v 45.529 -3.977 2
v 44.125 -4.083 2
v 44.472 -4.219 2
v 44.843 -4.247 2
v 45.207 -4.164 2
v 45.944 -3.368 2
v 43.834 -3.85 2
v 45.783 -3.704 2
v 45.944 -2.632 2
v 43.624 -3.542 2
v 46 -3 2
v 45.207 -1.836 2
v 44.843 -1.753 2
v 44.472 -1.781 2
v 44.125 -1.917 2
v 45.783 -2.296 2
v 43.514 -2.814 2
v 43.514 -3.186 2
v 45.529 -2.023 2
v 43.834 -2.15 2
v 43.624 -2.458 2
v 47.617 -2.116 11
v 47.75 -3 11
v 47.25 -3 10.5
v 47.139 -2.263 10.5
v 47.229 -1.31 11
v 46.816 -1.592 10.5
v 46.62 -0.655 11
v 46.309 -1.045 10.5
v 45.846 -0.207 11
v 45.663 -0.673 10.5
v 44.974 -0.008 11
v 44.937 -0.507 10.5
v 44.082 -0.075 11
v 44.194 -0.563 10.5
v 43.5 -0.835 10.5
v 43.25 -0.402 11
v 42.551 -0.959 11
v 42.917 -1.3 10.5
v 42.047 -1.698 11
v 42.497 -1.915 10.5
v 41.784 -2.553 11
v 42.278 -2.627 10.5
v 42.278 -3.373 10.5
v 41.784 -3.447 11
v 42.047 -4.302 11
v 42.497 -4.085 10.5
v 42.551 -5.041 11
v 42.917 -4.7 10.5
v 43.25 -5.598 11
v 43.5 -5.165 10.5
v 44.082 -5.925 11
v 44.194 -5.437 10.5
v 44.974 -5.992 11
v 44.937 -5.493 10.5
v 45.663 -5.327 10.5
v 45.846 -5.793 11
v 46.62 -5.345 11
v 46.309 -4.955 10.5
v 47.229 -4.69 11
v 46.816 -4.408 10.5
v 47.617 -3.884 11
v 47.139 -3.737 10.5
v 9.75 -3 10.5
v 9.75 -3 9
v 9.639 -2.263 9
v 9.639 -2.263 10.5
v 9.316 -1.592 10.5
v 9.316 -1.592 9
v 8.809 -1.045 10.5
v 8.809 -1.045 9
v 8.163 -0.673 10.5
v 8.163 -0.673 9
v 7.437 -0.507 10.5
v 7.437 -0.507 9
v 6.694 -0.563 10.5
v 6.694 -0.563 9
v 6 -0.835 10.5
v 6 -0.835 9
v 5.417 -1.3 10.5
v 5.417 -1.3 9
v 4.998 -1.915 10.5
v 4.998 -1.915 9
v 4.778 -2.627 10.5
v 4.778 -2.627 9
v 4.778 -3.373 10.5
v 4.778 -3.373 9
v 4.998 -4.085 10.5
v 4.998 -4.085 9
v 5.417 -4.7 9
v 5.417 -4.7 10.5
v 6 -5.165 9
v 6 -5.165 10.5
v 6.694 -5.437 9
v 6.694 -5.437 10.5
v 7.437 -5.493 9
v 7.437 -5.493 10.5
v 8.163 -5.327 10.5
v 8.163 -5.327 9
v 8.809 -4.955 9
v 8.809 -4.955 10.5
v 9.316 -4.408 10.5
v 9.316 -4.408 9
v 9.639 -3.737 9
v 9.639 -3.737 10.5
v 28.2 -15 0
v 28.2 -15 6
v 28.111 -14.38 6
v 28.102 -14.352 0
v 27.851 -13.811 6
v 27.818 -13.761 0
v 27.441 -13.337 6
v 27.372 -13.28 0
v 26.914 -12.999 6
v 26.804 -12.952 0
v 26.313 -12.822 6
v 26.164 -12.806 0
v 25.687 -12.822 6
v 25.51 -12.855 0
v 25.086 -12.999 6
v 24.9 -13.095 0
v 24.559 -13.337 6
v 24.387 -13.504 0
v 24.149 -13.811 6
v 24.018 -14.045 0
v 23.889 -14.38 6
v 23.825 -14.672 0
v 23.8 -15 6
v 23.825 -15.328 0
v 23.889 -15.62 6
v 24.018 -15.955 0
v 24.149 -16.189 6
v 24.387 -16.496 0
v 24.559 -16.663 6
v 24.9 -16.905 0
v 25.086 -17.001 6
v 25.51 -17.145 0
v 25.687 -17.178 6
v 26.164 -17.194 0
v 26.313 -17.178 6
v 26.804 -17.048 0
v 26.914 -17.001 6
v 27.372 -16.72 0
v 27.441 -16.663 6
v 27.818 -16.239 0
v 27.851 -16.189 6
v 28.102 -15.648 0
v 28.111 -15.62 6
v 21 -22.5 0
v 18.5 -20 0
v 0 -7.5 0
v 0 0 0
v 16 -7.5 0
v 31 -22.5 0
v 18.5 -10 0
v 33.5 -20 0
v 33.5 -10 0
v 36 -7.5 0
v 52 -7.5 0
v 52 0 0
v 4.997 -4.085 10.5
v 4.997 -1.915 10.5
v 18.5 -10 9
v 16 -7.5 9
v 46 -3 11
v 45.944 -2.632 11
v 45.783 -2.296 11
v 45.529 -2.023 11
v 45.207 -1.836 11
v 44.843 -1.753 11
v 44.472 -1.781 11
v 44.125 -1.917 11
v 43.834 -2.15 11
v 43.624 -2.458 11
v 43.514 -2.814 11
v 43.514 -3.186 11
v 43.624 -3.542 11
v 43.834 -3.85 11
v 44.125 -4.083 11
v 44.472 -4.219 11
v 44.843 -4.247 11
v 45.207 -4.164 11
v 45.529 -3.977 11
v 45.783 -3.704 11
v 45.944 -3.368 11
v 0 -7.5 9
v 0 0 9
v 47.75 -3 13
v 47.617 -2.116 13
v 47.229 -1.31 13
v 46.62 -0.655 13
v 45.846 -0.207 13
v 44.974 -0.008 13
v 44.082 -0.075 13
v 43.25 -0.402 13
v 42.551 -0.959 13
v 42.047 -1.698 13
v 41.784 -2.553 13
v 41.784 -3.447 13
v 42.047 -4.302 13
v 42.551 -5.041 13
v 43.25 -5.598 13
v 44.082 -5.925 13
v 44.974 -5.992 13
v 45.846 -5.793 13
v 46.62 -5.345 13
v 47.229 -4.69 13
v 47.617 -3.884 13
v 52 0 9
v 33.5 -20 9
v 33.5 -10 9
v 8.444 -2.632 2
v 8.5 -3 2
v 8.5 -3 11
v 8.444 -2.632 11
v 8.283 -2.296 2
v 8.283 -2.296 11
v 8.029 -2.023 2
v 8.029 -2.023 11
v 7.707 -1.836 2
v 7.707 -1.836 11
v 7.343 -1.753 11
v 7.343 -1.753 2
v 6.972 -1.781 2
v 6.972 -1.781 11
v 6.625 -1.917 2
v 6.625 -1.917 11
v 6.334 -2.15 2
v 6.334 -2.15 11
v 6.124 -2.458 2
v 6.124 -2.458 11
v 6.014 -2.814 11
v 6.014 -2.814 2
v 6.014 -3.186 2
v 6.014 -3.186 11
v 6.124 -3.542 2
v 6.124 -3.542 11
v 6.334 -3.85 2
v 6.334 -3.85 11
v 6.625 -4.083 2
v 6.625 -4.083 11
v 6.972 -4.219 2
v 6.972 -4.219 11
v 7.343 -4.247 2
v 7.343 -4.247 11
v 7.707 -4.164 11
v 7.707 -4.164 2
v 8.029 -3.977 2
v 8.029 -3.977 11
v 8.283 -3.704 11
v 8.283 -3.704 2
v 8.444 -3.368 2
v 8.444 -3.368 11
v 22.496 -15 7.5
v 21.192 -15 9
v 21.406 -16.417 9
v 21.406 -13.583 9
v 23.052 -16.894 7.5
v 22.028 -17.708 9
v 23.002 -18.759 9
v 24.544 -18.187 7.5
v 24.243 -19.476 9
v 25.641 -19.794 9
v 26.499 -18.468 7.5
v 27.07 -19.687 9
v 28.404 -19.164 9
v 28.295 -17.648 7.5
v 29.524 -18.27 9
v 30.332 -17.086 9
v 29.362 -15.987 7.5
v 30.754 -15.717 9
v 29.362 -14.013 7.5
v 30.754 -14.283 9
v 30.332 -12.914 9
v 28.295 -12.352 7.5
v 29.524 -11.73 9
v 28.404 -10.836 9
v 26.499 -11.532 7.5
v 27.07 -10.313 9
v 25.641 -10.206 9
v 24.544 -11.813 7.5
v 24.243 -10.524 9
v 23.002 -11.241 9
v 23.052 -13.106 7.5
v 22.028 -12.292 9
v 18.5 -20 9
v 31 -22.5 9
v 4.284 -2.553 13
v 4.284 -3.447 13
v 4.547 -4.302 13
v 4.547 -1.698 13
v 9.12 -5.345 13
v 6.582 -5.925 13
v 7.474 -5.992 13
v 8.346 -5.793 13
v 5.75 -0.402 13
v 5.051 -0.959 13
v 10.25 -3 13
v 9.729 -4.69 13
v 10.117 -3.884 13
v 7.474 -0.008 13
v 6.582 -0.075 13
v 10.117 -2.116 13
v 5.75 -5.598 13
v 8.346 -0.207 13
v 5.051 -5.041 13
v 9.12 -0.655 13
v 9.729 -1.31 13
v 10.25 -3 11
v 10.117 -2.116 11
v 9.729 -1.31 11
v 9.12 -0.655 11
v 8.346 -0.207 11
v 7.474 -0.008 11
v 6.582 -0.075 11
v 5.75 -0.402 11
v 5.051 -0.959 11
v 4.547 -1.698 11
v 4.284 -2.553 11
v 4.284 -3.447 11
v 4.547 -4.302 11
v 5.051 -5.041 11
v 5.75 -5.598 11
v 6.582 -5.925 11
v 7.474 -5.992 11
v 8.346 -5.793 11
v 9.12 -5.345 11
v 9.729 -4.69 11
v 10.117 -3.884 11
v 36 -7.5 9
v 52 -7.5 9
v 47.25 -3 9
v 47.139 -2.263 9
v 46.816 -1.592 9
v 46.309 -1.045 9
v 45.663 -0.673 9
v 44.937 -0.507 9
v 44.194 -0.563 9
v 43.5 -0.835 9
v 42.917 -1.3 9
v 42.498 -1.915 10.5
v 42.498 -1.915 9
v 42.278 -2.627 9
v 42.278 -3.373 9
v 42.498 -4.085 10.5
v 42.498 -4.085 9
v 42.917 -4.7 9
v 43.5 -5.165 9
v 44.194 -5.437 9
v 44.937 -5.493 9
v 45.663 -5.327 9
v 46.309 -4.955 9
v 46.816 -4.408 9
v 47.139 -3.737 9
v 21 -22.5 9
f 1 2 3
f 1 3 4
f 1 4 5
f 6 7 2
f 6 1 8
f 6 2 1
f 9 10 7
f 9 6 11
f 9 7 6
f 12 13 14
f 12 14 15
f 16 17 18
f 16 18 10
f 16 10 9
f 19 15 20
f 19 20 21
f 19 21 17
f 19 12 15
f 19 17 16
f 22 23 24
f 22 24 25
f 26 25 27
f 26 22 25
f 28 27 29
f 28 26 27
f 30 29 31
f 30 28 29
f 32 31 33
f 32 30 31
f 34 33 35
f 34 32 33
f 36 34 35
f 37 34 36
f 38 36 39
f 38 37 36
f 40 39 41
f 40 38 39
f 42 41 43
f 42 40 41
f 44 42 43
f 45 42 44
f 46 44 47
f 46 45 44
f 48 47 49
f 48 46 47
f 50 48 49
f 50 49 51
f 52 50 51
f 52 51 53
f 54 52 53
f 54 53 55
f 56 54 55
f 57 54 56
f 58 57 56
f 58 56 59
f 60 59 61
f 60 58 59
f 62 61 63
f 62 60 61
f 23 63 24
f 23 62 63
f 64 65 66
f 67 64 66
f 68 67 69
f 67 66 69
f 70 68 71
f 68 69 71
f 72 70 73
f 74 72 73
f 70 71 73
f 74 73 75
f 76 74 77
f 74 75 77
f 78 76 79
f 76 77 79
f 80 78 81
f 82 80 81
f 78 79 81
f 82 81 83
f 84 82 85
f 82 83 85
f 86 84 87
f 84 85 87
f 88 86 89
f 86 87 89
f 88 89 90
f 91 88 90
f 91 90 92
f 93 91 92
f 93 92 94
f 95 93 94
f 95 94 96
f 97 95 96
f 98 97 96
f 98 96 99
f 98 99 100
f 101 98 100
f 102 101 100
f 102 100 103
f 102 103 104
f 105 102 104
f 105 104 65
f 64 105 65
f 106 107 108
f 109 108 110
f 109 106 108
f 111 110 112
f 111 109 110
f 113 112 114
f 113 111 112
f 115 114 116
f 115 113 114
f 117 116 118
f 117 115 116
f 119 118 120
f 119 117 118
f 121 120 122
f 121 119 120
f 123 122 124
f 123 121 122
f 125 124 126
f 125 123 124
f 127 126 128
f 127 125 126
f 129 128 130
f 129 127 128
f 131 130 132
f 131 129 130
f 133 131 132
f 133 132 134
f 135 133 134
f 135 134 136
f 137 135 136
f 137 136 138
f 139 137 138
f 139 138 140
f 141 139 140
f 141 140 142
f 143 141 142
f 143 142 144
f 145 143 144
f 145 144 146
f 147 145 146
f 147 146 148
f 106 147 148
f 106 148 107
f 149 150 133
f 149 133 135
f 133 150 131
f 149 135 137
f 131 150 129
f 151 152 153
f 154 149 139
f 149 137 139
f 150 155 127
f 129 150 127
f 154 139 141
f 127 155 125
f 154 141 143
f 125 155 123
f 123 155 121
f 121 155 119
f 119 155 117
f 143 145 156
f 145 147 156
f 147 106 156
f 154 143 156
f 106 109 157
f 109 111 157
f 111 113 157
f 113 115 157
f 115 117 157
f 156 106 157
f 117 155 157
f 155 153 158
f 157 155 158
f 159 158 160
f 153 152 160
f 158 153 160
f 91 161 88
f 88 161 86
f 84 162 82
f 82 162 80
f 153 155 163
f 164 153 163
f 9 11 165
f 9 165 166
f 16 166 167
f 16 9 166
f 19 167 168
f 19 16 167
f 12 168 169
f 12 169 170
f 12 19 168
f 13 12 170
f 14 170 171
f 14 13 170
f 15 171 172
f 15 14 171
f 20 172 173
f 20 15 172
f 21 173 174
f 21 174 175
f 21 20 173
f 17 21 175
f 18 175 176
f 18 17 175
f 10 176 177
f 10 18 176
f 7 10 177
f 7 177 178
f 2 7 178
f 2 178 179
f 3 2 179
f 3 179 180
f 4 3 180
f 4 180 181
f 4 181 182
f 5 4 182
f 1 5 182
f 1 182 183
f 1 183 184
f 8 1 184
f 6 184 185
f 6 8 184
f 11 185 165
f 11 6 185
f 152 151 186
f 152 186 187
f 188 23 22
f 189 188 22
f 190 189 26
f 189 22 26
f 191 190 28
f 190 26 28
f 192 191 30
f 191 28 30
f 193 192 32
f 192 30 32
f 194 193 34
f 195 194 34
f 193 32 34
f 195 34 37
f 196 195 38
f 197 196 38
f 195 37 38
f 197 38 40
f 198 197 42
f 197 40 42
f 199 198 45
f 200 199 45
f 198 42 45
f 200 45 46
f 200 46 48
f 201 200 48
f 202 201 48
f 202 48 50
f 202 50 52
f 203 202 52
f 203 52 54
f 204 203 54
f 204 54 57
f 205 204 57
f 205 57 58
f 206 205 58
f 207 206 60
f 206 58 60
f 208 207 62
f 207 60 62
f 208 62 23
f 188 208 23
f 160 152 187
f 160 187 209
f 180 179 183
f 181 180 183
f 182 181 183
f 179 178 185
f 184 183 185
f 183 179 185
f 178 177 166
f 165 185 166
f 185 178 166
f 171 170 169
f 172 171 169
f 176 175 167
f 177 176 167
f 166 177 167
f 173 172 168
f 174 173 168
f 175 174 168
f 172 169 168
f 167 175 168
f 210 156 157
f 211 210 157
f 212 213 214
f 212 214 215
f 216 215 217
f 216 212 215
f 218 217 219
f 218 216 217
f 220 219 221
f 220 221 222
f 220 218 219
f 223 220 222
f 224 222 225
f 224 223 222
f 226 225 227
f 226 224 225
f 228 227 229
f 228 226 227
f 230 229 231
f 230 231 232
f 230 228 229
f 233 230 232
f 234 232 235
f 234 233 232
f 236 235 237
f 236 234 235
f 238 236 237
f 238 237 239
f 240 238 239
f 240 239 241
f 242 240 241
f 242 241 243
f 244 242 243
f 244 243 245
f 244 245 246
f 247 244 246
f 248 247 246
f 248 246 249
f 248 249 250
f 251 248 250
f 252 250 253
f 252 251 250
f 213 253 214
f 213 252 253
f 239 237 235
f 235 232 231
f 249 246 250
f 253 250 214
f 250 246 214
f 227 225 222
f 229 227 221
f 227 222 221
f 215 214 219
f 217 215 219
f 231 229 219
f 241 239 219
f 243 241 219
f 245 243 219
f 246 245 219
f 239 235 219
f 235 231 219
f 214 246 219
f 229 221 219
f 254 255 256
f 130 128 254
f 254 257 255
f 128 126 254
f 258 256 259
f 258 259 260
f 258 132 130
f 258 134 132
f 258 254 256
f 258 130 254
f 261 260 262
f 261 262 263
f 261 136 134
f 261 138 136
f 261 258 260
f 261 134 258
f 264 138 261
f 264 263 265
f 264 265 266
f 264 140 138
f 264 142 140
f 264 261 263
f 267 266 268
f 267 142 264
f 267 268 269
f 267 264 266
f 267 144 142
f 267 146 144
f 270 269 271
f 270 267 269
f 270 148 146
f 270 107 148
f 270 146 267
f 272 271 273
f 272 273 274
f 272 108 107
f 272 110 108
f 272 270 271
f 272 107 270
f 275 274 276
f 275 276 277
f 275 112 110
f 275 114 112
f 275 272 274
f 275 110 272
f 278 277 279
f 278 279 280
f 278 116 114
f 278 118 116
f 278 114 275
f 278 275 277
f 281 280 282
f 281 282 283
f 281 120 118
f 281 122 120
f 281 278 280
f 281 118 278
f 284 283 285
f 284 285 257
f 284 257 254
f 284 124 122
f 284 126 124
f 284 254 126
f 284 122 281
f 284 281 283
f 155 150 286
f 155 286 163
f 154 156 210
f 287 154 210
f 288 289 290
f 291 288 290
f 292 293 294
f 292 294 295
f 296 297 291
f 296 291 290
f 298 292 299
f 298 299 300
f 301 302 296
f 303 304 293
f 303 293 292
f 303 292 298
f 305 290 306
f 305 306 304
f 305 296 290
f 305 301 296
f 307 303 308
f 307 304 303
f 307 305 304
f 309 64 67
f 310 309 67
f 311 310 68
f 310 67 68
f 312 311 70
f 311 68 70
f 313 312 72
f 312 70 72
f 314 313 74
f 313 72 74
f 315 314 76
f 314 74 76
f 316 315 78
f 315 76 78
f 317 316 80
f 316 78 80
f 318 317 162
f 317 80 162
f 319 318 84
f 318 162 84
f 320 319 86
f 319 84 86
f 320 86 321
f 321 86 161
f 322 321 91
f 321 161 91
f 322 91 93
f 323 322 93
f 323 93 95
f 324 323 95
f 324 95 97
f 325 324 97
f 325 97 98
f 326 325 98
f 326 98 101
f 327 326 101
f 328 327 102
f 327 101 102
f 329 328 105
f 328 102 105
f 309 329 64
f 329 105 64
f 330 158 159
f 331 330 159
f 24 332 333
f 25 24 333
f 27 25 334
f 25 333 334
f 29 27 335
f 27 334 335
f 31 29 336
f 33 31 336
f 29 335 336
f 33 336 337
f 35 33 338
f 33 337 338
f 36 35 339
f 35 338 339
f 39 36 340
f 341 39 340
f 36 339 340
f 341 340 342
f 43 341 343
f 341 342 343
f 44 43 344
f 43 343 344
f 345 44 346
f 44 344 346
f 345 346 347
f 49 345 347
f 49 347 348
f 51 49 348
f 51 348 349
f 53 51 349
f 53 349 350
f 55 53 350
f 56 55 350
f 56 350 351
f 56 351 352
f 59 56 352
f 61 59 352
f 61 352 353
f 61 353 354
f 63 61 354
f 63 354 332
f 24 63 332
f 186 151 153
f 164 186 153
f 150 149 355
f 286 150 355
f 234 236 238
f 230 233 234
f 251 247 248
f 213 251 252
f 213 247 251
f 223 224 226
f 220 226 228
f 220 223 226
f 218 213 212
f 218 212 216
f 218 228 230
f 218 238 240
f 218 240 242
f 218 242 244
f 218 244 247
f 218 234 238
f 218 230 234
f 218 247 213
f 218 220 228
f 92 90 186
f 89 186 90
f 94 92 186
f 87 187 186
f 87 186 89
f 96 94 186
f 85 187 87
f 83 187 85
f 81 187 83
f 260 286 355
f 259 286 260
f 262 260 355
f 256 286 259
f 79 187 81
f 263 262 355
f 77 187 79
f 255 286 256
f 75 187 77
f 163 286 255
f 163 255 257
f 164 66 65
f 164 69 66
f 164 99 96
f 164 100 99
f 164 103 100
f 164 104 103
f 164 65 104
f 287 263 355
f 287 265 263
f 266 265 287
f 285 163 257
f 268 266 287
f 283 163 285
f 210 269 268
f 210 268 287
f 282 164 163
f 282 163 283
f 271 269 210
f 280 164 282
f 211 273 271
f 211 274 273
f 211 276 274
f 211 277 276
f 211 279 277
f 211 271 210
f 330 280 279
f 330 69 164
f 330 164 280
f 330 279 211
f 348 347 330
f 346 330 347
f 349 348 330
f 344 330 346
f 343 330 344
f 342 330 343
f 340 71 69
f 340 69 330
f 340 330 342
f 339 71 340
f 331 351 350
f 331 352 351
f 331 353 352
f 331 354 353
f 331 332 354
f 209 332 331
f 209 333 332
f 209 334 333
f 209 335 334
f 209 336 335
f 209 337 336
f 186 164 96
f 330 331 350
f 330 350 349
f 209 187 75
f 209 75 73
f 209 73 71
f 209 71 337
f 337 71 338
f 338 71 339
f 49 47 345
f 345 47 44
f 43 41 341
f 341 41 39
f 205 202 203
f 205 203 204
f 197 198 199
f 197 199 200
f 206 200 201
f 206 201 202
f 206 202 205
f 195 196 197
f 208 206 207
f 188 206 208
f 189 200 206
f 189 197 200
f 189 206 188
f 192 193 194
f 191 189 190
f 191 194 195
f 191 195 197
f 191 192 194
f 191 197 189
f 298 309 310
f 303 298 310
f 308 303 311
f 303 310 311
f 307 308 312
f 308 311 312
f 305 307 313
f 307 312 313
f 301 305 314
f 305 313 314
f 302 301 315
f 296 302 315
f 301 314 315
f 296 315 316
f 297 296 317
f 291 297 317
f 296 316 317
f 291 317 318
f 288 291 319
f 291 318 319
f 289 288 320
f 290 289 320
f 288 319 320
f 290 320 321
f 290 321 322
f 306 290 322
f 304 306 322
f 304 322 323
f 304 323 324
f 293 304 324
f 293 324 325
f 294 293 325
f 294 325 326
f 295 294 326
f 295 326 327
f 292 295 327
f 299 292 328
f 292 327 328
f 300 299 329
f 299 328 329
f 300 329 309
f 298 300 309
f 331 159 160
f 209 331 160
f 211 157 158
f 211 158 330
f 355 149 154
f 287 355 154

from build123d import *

# Parameters (mm, degrees)
SKETCH1_W                = 52
SKETCH1_H                = 7.5
SKETCH1_R                = 2.5
SKETCH1_W_2              = 15
SKETCH1_H_2              = 15
SKETCH1_R_2              = 2.2
BOSS_EXTRUDE1_DEPTH      = 9
BOSS_EXTRUDE2_DEPTH      = 1.5
BOSS_EXTRUDE2_DEPTH_BACK = 9
SKETCH2_R                = 2.5
SKETCH4_R                = 3
BOSS_EXTRUDE3_DEPTH      = 2.5
CHAMFER1_SIZE            = 0.5
CHAMFER2_SIZE            = 2.5
CUT_EXTRUDE1_DEPTH       = 2
CUT_EXTRUDE1_DEPTH_BACK  = 7
SKETCH5_R                = 1.25


with BuildPart() as part:
    # Sketch1 → Boss-Extrude1 (new body)
    # profile 1 of 2: a face of its own
    with BuildSketch(Plane.XY):
        with Locations((26, -3.75)):
            Rectangle(SKETCH1_W, SKETCH1_H)
        with Locations((7.25, -3)):
            Circle(SKETCH1_R, mode=Mode.SUBTRACT)
        with Locations((44.75, -3)):
            Circle(SKETCH1_R, mode=Mode.SUBTRACT)
    # profile 2 of 2: a face of its own
    with BuildSketch(Plane.XY):
        with Locations((26, -15)):
            Rectangle(SKETCH1_W_2, SKETCH1_H_2)
        with Locations((26, -15)):
            Circle(SKETCH1_R_2, mode=Mode.SUBTRACT)
    extrude(amount=BOSS_EXTRUDE1_DEPTH)

    # Sketch2 → Boss-Extrude2 (add, two sides: drawn at the far end of the back side and taken through both)
    with BuildSketch(Plane.XY.offset(9).offset(-BOSS_EXTRUDE2_DEPTH_BACK)):
        with Locations((7.25, -3)):
            Circle(SKETCH2_R)
        with Locations((44.75, -3)):
            Circle(SKETCH2_R)
    extrude(amount=BOSS_EXTRUDE2_DEPTH + BOSS_EXTRUDE2_DEPTH_BACK)

    # Sketch3 → Cut-Revolve1 (revolve, cut)
    with BuildSketch(Plane(origin=(0, -15, 0), x_dir=(1, 0, 0), z_dir=(0, 1, 0)), mode=Mode.PRIVATE) as cut_revolve1_sk:
        Polygon((26, -9), (30.807860213, -9), (28.2, -6), (26, -6), align=None)
    revolve(cut_revolve1_sk.sketch.rotate(Axis((26, -15, 6), (0, 0, 1)), 180), axis=Axis((26, -15, 6), (0, 0, 1)), mode=Mode.SUBTRACT)

    # Sketch4 → Boss-Extrude3 (add)
    with BuildSketch(Plane.XY.offset(10.5)):
        with Locations((7.25, -3)):
            Circle(SKETCH4_R)
        with Locations((44.75, -3)):
            Circle(SKETCH4_R)
    extrude(amount=BOSS_EXTRUDE3_DEPTH)

    # Chamfer1
    chamfer1_edges = [part.edges().sort_by_distance(p)[0] for p in [
        (4.25, -3, 10.5),
        (41.75, -3, 10.5),
    ]]
    chamfer(chamfer1_edges, length=CHAMFER1_SIZE - 0.0001)  # a hair under: the kernel refuses the full size

    # Chamfer2
    chamfer2_edges = [part.edges().sort_by_distance(p)[0] for p in [
        (33.5, -7.5, 4.5),
        (33.5, -22.5, 4.5),
        (18.5, -22.5, 4.5),
        (18.5, -7.5, 4.5),
    ]]
    chamfer(chamfer2_edges, length=CHAMFER2_SIZE)

    # Sketch5 → Cut-Extrude1 (cut, two sides: drawn at the far end of the back side and taken through both)
    with BuildSketch(Plane.XY.offset(9).offset(-CUT_EXTRUDE1_DEPTH_BACK)):
        with Locations((7.25, -3)):
            Circle(SKETCH5_R)
        with Locations((44.75, -3)):
            Circle(SKETCH5_R)
    extrude(amount=CUT_EXTRUDE1_DEPTH + CUT_EXTRUDE1_DEPTH_BACK, mode=Mode.SUBTRACT)


solid = part.part
